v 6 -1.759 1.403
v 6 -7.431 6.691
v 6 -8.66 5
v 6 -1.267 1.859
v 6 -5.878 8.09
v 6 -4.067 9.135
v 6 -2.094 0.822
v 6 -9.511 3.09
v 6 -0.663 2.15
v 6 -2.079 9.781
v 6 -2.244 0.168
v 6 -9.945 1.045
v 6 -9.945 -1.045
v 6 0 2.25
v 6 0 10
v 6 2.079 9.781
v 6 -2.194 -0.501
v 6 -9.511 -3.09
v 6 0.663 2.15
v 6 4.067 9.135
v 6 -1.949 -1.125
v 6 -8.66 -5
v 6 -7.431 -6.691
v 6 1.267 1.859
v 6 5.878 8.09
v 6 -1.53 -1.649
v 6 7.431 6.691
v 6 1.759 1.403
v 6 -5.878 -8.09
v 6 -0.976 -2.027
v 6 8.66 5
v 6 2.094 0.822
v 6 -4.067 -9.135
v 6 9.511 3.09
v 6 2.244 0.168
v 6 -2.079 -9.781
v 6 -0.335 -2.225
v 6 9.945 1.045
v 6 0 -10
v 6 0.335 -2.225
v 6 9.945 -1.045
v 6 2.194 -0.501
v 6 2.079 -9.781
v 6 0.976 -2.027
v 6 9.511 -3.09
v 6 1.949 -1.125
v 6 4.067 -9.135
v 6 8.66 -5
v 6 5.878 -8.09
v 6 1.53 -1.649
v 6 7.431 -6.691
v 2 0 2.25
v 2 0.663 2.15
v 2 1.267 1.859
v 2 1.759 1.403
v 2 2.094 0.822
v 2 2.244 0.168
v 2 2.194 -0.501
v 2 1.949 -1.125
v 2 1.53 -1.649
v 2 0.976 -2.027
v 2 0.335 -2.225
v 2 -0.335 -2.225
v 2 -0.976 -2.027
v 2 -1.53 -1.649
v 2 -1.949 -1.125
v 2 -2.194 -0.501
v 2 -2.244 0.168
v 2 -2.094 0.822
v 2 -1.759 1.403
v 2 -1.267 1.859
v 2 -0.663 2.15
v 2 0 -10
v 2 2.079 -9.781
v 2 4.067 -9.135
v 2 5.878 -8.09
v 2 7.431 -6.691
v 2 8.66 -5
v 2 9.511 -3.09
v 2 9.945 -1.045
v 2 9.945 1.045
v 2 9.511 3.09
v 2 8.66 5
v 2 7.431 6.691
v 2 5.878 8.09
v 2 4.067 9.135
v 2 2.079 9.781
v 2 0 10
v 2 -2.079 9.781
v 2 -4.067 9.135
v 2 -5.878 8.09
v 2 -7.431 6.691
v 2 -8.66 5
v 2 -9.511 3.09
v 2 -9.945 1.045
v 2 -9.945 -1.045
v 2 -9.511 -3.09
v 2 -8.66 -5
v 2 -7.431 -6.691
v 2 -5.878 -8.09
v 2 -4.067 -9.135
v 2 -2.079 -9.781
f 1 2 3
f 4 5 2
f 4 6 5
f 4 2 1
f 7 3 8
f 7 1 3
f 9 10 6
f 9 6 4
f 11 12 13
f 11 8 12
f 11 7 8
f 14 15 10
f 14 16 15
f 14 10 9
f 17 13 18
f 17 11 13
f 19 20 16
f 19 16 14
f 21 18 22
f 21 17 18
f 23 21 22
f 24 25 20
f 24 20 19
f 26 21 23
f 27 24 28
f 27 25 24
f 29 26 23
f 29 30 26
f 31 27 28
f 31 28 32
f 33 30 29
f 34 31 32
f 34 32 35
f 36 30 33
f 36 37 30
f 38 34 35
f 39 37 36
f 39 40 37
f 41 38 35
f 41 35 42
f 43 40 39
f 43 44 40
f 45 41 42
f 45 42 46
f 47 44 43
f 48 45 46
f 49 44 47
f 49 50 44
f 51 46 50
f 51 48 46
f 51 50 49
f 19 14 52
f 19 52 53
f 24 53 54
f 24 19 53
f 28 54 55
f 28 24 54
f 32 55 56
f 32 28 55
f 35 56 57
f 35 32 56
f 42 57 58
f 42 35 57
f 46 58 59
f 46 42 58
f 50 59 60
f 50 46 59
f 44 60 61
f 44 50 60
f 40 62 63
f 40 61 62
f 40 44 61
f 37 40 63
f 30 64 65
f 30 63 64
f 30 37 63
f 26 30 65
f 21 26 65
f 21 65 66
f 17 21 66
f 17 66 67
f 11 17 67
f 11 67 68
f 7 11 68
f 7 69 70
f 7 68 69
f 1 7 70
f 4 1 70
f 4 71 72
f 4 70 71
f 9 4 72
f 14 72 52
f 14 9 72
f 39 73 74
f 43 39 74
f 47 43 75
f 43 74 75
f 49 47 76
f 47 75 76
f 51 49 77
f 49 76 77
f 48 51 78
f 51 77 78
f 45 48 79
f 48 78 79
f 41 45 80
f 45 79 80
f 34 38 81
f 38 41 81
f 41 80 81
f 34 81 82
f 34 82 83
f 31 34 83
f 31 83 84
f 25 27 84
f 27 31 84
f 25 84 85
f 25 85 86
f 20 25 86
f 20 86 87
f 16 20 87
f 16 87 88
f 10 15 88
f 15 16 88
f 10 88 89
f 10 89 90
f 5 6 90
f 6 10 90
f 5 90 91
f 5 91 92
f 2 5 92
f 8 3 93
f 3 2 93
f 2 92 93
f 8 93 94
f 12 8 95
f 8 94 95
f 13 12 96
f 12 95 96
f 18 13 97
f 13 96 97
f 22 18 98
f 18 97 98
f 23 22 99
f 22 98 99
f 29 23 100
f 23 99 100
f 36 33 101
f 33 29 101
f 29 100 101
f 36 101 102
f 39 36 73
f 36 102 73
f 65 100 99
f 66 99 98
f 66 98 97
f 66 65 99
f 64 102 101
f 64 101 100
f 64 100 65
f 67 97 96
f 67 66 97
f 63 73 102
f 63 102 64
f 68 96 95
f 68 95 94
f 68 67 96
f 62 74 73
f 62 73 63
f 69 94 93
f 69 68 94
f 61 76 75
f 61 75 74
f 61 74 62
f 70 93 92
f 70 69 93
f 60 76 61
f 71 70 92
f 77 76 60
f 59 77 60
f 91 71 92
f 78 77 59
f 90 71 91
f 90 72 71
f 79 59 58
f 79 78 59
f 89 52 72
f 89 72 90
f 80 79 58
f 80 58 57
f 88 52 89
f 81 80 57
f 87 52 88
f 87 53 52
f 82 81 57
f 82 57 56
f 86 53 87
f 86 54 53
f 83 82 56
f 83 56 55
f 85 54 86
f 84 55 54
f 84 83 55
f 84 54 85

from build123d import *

# Parameters (mm, degrees)
SKETCH1_R               = 10
BOSS_EXTRUDE1_DEPTH     = 8
SKETCH2_R               = 13.5
CUT_EXTRUDE1_DEPTH      = 2
SKETCH3_R               = 13.5
CUT_EXTRUDE2_DEPTH      = 2
CUT_EXTRUDE3_DEPTH      = 15.696938457
CUT_EXTRUDE3_DEPTH_BACK = 15.696938457
SKETCH4_R               = 2.25


with BuildPart() as part:
    # Sketch1 → Boss-Extrude1 (new body)
    with BuildSketch(Plane(origin=(0, 0, 0), x_dir=(0, 0, -1), z_dir=(1, 0, 0))):
        Circle(SKETCH1_R)
    extrude(amount=BOSS_EXTRUDE1_DEPTH)

    # Sketch2 → Cut-Extrude1 (cut)
    with BuildSketch(Plane(origin=(8, 0, 0), x_dir=(0, 0, -1), z_dir=(1, 0, 0))):
        Circle(SKETCH2_R)
    extrude(amount=-CUT_EXTRUDE1_DEPTH, mode=Mode.SUBTRACT)

    # Sketch3 → Cut-Extrude2 (cut)
    with BuildSketch(Plane.ZY):
        Circle(SKETCH3_R)
    extrude(amount=-CUT_EXTRUDE2_DEPTH, mode=Mode.SUBTRACT)

    # Sketch4 → Cut-Extrude3 (cut, two sides: drawn at the far end of the back side and taken through both)
    with BuildSketch(Plane.ZY.offset(-2).offset(-CUT_EXTRUDE3_DEPTH_BACK)):
        Circle(SKETCH4_R)
    extrude(amount=CUT_EXTRUDE3_DEPTH + CUT_EXTRUDE3_DEPTH_BACK, mode=Mode.SUBTRACT)


solid = part.part
